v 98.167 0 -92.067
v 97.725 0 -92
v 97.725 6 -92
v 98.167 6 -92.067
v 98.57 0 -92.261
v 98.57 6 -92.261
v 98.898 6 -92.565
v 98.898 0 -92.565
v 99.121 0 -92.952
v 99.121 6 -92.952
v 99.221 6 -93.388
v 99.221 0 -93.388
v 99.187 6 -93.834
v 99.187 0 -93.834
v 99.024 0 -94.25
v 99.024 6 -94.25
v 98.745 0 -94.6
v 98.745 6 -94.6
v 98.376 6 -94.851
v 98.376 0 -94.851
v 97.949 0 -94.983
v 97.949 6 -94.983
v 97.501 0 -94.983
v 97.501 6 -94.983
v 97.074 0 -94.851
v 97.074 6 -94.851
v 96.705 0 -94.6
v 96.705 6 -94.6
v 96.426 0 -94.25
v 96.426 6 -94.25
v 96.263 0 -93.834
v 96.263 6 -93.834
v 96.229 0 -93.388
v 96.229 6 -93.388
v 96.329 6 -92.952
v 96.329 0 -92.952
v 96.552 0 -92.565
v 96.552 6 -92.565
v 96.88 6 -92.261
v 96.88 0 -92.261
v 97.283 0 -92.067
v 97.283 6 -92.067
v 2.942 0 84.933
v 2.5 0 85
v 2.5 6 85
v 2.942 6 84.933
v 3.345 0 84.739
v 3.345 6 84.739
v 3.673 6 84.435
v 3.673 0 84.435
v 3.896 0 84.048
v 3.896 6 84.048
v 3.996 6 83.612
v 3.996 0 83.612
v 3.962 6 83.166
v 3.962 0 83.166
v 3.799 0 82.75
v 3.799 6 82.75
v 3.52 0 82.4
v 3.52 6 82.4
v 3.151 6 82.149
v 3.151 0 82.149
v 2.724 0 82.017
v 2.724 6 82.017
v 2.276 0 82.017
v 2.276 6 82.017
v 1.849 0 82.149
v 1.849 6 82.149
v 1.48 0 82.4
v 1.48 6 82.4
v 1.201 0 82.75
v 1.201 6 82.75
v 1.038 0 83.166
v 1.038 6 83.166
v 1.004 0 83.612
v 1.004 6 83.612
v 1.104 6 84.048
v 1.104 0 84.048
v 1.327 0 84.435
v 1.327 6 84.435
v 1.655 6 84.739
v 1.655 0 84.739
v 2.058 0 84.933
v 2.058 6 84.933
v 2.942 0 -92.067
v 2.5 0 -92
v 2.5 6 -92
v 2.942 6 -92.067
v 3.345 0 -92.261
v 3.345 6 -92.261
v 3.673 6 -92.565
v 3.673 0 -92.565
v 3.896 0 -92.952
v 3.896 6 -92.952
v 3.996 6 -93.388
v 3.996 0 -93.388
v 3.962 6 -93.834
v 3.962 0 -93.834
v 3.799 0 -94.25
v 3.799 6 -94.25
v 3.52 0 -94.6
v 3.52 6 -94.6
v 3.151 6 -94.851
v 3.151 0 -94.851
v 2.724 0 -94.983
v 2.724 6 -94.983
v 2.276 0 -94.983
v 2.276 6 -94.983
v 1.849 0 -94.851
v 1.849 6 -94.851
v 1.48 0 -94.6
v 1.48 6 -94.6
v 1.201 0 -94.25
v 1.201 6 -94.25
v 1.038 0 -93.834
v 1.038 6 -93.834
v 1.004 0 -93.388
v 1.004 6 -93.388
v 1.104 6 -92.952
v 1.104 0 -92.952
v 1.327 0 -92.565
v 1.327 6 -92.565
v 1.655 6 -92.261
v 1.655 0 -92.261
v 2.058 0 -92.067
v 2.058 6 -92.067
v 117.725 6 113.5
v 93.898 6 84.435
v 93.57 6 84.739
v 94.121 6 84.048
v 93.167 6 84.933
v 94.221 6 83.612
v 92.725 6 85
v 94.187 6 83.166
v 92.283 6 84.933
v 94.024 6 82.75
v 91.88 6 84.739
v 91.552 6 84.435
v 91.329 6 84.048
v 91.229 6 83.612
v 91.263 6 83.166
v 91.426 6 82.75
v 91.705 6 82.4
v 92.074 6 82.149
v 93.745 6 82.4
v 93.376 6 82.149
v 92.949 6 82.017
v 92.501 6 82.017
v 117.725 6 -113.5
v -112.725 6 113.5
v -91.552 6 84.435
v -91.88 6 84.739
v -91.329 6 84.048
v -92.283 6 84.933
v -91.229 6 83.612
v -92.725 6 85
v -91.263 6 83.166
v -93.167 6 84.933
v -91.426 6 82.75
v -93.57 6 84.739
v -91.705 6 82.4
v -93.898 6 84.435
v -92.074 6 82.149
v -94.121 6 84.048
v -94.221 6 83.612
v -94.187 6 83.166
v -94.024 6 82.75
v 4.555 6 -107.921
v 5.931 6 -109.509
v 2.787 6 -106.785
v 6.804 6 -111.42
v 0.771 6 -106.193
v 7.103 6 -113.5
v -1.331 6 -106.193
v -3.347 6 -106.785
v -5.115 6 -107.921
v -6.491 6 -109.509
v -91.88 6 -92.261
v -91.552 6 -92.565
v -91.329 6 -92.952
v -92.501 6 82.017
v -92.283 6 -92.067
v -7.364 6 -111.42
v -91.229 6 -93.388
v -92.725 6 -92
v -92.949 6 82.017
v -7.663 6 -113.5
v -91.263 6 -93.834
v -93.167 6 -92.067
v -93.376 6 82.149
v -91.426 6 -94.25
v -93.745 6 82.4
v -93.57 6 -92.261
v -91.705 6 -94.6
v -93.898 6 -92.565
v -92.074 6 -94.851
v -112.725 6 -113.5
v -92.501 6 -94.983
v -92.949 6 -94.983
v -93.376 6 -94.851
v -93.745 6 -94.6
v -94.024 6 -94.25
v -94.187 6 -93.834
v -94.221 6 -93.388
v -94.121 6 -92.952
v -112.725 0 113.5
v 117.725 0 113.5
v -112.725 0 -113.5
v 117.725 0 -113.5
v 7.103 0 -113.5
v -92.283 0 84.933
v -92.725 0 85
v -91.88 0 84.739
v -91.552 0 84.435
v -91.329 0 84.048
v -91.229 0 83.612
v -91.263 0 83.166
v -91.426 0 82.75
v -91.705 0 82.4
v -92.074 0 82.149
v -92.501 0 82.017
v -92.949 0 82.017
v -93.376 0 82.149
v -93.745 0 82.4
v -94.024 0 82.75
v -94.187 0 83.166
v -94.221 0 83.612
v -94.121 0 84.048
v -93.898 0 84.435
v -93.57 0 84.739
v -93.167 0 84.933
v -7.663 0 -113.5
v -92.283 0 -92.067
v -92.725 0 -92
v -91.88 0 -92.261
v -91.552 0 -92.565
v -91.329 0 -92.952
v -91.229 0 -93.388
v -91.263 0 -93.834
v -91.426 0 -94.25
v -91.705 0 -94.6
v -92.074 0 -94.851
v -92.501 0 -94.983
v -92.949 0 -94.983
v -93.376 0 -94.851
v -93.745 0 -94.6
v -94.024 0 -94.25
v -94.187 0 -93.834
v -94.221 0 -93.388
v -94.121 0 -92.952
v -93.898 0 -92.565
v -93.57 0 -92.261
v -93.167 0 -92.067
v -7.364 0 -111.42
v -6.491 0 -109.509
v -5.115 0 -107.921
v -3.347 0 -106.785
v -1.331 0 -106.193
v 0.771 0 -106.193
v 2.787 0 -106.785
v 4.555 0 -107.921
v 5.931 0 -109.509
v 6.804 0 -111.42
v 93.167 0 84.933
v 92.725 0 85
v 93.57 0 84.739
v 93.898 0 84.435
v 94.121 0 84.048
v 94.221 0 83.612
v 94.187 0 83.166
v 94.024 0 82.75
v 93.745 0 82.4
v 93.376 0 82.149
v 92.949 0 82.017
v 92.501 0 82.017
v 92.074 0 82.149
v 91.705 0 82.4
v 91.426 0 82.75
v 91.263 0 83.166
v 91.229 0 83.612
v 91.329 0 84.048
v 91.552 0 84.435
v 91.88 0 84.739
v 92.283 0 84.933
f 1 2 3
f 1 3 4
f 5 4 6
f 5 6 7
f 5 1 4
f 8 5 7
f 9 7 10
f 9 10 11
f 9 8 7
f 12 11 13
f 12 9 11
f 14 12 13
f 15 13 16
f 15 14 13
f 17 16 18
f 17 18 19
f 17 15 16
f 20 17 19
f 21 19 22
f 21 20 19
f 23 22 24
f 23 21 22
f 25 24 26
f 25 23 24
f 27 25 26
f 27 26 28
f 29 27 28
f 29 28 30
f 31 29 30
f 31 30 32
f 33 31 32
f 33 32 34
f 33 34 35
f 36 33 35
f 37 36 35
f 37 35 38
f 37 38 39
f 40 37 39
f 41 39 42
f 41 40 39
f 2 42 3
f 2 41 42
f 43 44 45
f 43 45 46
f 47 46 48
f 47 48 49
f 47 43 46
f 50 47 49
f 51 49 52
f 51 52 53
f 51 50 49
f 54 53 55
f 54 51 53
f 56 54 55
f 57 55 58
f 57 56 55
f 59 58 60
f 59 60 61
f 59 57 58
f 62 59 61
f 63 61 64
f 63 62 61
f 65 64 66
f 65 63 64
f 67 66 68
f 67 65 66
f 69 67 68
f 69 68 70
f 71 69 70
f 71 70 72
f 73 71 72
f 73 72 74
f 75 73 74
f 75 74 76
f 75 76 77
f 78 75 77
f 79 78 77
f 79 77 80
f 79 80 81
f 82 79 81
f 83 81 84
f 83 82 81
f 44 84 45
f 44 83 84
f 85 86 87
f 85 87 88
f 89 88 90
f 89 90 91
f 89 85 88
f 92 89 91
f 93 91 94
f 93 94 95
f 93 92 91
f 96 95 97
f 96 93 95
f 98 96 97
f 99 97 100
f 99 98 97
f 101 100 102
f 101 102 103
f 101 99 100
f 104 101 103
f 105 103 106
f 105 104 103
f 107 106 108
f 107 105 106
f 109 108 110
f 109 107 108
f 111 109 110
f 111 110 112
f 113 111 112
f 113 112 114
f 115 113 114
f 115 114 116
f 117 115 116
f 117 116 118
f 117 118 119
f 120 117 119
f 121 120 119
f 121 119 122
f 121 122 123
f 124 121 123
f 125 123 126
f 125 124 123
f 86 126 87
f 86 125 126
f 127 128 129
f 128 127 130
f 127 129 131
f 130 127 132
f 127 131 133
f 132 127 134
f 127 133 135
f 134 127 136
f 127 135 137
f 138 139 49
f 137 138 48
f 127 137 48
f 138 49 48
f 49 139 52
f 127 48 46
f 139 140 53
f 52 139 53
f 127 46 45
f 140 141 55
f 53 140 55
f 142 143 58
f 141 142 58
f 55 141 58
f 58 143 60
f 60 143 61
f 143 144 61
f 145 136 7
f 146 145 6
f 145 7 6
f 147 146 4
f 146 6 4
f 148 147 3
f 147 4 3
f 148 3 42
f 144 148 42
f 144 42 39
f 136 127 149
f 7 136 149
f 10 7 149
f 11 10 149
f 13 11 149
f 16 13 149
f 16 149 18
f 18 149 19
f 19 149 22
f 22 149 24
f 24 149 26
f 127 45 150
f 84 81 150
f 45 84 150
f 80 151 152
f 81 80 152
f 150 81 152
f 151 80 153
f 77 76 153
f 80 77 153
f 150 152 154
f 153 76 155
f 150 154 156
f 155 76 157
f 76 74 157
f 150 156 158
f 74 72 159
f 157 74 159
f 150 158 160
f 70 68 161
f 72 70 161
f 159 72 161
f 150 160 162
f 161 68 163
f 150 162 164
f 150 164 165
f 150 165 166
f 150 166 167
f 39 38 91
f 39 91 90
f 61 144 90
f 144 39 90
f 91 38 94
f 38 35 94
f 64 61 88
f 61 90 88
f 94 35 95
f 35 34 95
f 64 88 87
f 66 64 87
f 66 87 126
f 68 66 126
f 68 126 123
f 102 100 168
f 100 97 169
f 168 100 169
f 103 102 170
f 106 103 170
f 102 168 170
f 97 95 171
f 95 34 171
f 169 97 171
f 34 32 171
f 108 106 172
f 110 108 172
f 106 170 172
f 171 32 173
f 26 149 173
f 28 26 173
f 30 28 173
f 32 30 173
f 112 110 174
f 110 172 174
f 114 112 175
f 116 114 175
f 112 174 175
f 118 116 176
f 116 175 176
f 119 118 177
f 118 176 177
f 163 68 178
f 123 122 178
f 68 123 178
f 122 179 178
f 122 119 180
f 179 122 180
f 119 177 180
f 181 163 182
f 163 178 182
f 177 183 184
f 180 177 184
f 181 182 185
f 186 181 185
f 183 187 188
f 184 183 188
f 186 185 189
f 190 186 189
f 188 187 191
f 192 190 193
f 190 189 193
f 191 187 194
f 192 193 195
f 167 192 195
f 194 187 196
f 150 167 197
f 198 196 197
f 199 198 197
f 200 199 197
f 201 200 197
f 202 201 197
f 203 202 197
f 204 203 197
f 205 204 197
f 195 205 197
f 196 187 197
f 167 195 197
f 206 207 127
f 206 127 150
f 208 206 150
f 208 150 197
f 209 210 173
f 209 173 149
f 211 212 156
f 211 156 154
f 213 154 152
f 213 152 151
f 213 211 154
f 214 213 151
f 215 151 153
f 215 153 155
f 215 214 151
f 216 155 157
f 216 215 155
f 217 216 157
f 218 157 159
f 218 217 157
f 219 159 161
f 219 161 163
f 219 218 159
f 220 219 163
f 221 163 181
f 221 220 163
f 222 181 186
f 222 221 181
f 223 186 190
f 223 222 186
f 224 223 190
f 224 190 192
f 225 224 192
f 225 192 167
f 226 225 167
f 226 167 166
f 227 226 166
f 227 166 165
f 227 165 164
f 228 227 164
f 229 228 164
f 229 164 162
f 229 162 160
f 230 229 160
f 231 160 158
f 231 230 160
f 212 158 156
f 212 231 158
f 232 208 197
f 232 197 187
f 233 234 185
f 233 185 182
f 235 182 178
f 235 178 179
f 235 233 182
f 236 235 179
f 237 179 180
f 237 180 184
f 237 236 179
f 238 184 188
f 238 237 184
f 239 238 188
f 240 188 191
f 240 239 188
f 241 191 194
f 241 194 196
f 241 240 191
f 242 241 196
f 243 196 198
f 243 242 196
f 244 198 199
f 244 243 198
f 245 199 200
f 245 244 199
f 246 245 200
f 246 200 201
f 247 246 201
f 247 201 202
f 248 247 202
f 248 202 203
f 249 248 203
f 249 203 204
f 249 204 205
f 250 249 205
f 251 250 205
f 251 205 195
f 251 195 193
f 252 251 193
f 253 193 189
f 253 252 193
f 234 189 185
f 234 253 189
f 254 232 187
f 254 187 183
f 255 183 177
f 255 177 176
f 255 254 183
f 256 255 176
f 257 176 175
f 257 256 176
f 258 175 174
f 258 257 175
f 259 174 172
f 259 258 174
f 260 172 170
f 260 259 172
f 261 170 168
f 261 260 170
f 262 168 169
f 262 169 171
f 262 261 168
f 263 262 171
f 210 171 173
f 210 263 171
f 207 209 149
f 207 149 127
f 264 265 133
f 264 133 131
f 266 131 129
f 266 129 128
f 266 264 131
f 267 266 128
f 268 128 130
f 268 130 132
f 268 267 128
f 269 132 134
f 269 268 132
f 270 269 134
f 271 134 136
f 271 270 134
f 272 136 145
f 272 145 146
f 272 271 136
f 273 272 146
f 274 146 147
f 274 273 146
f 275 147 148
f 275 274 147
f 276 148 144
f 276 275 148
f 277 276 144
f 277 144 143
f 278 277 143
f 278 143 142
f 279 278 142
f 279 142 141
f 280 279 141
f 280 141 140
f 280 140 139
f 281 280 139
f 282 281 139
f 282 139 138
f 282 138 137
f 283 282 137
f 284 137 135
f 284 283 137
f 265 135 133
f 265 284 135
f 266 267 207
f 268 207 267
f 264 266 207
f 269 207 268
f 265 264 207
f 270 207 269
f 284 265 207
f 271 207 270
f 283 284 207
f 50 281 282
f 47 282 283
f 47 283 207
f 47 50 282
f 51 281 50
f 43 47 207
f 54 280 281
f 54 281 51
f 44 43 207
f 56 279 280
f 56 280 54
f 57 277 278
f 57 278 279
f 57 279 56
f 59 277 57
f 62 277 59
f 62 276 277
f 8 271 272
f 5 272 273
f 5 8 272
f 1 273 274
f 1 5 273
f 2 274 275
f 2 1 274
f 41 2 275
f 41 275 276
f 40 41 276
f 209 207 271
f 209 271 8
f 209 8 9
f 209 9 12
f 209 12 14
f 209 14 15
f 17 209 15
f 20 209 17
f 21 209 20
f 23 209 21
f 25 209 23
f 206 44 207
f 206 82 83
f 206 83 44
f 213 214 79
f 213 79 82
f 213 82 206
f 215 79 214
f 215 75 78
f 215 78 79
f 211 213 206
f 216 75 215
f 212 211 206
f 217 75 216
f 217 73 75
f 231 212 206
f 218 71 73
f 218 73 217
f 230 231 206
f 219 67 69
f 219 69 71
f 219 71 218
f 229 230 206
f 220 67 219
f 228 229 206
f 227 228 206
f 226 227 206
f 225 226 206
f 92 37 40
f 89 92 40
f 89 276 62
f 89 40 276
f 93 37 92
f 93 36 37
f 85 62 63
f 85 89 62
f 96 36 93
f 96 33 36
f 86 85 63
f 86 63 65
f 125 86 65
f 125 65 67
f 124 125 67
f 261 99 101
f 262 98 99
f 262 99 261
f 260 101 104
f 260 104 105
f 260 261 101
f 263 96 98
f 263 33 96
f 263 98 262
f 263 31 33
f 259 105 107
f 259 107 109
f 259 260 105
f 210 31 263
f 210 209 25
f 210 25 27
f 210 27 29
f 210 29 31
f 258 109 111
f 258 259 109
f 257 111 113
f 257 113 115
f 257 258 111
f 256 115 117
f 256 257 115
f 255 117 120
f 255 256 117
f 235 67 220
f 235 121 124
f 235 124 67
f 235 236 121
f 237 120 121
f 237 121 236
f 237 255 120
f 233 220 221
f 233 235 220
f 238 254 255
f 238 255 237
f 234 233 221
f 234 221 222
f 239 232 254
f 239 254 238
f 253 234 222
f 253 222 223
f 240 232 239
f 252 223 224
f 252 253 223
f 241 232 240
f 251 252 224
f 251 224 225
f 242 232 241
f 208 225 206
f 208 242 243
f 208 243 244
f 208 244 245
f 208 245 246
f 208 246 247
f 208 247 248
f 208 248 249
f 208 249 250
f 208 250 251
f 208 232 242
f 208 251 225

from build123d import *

# Parameters (mm, degrees)
SKETCH_1_R      = 1.5
EXTRUDE_1_DEPTH = 6


with BuildPart() as part:
    # 草图1 → 凸台-拉伸1 (new body)
    with BuildSketch(Plane(origin=(0, 0, 0), x_dir=(1, 0, 0), z_dir=(0, 1, 0))):
        with BuildLine():
            Line((-112.725, 113.5), (-7.662552173, 113.5))
            ThreePointArc((-7.662552173, 113.5), (-0.28, 106.117447827), (7.102552173, 113.5))
            Line((7.102552173, 113.5), (7.5, 113.5))
            Line((7.5, 113.5), (117.725, 113.5))
            Line((117.725, 113.5), (117.725, -113.5))
            Line((117.725, -113.5), (-112.725, -113.5))
            Line((-112.725, -113.5), (-112.725, 113.5))
        make_face()
        with Locations(Location((-92.725, 93.5, 0), (0, 0, 270))):
            Circle(SKETCH_1_R, mode=Mode.SUBTRACT)
        with Locations(Location((97.725, 93.5, 0), (0, 0, 270))):
            Circle(SKETCH_1_R, mode=Mode.SUBTRACT)
        with Locations(Location((2.5, 93.5, 0), (0, 0, 270))):
            Circle(SKETCH_1_R, mode=Mode.SUBTRACT)
        with Locations(Location((-92.725, -83.5, 0), (0, 0, 270))):
            Circle(SKETCH_1_R, mode=Mode.SUBTRACT)
        with Locations(Location((2.5, -83.5, 0), (0, 0, 270))):
            Circle(SKETCH_1_R, mode=Mode.SUBTRACT)
        with Locations(Location((92.725, -83.5, 0), (0, 0, 270))):
            Circle(SKETCH_1_R, mode=Mode.SUBTRACT)
    extrude(amount=EXTRUDE_1_DEPTH)


solid = part.part
